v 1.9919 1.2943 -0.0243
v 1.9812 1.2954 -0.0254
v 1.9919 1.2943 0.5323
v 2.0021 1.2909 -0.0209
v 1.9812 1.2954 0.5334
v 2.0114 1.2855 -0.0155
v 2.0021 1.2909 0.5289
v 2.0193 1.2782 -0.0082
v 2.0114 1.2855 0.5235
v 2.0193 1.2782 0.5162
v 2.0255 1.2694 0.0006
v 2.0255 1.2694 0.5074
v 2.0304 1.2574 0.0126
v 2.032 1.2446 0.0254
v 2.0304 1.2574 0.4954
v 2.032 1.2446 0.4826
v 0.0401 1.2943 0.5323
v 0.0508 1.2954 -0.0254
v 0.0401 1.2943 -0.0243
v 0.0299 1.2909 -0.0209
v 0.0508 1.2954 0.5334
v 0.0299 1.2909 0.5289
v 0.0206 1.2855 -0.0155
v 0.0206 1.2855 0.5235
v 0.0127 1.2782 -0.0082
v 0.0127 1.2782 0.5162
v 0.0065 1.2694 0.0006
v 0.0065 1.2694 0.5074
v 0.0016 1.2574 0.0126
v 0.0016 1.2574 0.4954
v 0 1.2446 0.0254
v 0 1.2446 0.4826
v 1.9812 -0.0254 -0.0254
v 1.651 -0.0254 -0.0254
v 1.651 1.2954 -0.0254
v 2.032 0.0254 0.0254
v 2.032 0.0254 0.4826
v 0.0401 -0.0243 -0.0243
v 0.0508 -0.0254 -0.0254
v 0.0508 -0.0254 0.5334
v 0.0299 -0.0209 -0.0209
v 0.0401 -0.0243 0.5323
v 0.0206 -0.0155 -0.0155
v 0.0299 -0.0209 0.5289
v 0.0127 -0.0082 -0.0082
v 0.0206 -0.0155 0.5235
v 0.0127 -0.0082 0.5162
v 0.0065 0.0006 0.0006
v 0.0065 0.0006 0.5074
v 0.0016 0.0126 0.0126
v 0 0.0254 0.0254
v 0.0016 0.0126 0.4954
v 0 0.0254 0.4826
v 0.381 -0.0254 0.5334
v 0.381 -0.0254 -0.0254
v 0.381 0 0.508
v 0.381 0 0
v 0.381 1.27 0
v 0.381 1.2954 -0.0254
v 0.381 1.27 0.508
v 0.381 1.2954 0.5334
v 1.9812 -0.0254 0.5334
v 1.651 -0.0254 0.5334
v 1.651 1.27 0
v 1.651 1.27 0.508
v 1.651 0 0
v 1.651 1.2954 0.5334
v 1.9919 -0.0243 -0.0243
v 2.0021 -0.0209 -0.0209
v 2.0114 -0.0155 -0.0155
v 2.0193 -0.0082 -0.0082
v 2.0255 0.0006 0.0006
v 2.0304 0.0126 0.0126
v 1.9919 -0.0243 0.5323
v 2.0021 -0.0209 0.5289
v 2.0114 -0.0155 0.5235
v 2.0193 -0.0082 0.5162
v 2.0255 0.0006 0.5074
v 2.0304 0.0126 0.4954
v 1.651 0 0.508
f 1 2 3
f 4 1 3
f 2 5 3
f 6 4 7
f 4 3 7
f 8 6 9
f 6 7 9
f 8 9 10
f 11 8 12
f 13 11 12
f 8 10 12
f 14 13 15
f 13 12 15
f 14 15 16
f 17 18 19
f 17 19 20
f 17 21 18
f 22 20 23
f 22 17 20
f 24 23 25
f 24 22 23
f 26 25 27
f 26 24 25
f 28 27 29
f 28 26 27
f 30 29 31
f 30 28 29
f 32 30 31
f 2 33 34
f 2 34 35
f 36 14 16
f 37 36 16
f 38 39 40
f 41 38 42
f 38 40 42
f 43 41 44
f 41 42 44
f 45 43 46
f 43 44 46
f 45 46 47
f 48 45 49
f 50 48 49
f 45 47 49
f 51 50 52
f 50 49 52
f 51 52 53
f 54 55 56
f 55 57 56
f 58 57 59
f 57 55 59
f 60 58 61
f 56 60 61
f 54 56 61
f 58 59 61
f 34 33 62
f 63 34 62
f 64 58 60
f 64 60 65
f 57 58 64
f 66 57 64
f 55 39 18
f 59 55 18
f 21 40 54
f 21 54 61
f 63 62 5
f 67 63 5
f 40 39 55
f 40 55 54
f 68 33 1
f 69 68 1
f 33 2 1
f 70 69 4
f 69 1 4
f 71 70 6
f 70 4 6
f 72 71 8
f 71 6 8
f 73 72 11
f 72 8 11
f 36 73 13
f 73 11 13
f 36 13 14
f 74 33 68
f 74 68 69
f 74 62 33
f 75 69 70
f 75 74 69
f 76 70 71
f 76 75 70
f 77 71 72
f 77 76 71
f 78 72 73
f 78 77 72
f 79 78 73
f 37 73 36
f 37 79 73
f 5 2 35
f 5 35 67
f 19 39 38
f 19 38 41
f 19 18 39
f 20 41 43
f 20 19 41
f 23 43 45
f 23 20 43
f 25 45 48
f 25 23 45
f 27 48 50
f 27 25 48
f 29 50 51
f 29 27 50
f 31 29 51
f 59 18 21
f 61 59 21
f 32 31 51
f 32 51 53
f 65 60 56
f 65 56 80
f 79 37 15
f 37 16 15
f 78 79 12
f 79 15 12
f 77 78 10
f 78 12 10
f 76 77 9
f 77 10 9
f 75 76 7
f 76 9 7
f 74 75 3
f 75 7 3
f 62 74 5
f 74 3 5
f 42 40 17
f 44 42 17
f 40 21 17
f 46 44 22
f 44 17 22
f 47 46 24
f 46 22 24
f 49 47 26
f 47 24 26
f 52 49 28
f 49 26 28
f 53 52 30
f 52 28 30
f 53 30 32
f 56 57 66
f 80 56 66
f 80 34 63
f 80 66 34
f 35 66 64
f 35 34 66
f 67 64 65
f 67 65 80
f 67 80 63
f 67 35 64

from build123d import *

# Parameters (mm, degrees)
SKETCH1_W           = 2.032
SKETCH1_H           = 1.27
BOSS_EXTRUDE1_DEPTH = 0.508
SKETCH2_W           = 0.5588
SKETCH2_H           = 1.3208
BOSS_EXTRUDE2_DEPTH = 0.381
FILLET1_R           = 0.0508


with BuildPart() as part:
    # Sketch1 → Boss-Extrude1 (new body)
    with BuildSketch(Plane.XY):
        with Locations((1.016, 0.635)):
            Rectangle(SKETCH1_W, SKETCH1_H)
    extrude(amount=BOSS_EXTRUDE1_DEPTH)

    # Sketch2 → Boss-Extrude2 (add)
    with BuildSketch(Plane.ZY):
        with Locations((0.254, 0.635)):
            Rectangle(SKETCH2_W, SKETCH2_H)
    boss_extrude2 = extrude(amount=-BOSS_EXTRUDE2_DEPTH)

    # Mirror1: Boss-Extrude2 across plane
    add(boss_extrude2.mirror(Plane.ZY.offset(-1.016)))

    # Fillet1
    fillet1_edges = [part.edges().sort_by_distance(p)[0] for p in [
        (0, 1.2954, 0.254),
        (0, 0.635, -0.0254),
        (0, -0.0254, 0.254),
        (0, 0.635, 0.5334),
        (2.032, 1.2954, 0.254),
        (2.032, 0.635, -0.0254),
        (2.032, -0.0254, 0.254),
        (2.032, 0.635, 0.5334),
    ]]
    fillet(fillet1_edges, radius=FILLET1_R)


solid = part.part
